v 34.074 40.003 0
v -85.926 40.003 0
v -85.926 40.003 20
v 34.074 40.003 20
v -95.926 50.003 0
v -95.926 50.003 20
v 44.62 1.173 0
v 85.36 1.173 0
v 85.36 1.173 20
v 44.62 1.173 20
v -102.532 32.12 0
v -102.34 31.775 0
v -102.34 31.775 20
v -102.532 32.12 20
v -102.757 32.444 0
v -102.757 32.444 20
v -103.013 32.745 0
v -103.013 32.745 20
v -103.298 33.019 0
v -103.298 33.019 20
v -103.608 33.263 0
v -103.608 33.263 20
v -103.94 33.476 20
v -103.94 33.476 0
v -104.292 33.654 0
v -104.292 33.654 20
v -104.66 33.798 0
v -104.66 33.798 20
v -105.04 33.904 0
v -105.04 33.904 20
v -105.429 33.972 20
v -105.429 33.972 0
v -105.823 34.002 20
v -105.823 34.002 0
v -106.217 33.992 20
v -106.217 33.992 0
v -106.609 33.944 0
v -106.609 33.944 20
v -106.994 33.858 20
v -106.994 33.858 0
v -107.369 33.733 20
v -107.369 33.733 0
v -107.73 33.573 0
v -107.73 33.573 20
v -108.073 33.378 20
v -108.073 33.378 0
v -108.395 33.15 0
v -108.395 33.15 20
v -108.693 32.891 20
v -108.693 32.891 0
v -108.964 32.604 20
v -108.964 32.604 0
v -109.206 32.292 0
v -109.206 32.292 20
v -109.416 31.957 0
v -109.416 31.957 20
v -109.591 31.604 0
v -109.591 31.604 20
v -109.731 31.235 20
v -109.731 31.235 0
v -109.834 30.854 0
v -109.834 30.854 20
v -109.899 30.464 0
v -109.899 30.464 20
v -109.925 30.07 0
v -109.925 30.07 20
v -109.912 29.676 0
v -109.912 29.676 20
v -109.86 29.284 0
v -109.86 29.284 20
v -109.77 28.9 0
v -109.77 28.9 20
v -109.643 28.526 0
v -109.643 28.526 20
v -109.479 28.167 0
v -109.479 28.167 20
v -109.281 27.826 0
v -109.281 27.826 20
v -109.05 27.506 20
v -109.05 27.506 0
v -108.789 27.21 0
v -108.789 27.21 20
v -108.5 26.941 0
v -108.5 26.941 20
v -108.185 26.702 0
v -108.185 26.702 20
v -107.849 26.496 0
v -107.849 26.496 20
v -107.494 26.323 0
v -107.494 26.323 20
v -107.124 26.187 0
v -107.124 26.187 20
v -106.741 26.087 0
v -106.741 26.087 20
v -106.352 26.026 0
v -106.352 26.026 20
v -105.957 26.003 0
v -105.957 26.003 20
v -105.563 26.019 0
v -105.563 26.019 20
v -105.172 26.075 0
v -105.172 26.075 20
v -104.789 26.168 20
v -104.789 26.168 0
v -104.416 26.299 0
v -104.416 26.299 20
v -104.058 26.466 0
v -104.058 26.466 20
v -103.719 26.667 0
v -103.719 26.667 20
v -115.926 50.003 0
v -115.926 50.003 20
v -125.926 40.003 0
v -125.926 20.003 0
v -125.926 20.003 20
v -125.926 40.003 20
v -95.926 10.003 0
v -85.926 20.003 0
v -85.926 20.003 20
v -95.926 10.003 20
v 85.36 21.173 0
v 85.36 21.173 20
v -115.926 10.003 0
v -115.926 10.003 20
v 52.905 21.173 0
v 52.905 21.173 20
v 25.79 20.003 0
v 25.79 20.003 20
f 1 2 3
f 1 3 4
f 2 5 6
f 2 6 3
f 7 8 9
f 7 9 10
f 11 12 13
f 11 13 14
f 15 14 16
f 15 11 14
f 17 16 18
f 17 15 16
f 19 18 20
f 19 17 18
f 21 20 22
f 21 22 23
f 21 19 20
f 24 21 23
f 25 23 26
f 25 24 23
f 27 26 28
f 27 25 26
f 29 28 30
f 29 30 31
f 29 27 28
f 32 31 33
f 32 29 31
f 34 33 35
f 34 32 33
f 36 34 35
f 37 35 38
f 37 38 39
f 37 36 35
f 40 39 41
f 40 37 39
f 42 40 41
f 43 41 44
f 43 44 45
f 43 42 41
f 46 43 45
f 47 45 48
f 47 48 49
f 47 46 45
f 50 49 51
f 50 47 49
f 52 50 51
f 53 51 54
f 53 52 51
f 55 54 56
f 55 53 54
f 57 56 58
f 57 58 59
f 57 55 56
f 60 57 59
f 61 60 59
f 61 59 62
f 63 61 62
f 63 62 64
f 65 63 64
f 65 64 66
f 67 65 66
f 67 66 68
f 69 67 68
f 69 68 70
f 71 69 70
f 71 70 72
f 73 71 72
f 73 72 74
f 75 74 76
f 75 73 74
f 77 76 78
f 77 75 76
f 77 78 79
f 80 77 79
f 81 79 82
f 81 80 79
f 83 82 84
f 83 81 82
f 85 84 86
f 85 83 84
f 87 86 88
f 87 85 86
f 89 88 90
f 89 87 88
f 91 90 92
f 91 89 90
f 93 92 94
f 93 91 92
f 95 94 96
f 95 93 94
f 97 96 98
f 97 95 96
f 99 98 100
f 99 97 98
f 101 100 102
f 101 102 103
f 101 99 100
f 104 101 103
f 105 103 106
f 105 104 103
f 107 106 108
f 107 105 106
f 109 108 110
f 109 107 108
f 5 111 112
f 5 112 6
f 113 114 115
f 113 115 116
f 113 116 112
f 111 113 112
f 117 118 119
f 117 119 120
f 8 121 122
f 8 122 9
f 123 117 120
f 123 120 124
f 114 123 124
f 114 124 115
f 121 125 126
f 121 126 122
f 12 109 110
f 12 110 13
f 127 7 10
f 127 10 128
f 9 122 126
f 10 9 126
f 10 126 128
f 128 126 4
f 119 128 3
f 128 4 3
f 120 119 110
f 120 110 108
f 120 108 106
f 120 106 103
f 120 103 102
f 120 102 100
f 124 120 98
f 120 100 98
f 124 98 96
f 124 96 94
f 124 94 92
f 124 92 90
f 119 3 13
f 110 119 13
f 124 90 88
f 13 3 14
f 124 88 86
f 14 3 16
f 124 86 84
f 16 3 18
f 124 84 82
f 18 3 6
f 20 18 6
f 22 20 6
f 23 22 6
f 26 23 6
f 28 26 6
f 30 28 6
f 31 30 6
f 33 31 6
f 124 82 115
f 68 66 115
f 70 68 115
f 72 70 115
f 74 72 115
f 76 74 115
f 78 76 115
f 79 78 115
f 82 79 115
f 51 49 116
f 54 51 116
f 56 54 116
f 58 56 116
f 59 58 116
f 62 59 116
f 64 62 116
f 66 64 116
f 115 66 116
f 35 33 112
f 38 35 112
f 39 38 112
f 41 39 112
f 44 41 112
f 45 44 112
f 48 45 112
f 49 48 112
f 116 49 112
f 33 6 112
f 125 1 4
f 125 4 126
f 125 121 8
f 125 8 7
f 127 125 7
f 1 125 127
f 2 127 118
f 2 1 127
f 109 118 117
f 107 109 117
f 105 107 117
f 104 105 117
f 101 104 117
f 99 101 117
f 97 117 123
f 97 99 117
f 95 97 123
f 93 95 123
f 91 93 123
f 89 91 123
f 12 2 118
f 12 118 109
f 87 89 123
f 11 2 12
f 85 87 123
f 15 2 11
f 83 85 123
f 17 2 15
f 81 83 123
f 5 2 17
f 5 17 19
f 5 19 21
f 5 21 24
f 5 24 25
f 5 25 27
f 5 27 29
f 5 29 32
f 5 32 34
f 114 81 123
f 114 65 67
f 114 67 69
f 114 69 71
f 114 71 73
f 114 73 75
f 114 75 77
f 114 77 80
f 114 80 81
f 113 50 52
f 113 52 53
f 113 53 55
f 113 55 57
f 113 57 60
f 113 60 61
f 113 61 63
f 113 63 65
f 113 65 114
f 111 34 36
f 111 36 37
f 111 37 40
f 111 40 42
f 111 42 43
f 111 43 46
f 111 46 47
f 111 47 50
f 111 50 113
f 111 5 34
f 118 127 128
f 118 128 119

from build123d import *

# Parameters (mm, degrees)
BOSS_EXTRUDE1_DEPTH = 20


with BuildPart() as part:
    # Sketch1 → Boss-Extrude1 (new body)
    with BuildSketch(Plane.XY):
        Polygon((-125.92552771, 40.003004944), (-115.92552771, 50.003004944), (-95.92552771, 50.003004944), (-85.92552771, 40.003003647), (34.07447229, 40.003003647), (52.904699458, 21.17277648), (85.359896376, 21.17277648), (85.359896376, 1.17277648), (44.62042821, 1.17277648), (25.790201043, 20.003003647), (-85.92552771, 20.003003647), (-95.92552771, 10.003004944), (-115.92552771, 10.003004944), (-125.92552771, 20.003004944), align=None)
        with BuildLine():
            Line((-103.718736643, 26.666828512), (-102.339668887, 31.775465524))
            ThreePointArc((-102.339668887, 31.775465524), (-109.787294302, 31.04548218), (-103.718736643, 26.666828512))
        make_face(mode=Mode.SUBTRACT)
    extrude(amount=BOSS_EXTRUDE1_DEPTH)


solid = part.part
